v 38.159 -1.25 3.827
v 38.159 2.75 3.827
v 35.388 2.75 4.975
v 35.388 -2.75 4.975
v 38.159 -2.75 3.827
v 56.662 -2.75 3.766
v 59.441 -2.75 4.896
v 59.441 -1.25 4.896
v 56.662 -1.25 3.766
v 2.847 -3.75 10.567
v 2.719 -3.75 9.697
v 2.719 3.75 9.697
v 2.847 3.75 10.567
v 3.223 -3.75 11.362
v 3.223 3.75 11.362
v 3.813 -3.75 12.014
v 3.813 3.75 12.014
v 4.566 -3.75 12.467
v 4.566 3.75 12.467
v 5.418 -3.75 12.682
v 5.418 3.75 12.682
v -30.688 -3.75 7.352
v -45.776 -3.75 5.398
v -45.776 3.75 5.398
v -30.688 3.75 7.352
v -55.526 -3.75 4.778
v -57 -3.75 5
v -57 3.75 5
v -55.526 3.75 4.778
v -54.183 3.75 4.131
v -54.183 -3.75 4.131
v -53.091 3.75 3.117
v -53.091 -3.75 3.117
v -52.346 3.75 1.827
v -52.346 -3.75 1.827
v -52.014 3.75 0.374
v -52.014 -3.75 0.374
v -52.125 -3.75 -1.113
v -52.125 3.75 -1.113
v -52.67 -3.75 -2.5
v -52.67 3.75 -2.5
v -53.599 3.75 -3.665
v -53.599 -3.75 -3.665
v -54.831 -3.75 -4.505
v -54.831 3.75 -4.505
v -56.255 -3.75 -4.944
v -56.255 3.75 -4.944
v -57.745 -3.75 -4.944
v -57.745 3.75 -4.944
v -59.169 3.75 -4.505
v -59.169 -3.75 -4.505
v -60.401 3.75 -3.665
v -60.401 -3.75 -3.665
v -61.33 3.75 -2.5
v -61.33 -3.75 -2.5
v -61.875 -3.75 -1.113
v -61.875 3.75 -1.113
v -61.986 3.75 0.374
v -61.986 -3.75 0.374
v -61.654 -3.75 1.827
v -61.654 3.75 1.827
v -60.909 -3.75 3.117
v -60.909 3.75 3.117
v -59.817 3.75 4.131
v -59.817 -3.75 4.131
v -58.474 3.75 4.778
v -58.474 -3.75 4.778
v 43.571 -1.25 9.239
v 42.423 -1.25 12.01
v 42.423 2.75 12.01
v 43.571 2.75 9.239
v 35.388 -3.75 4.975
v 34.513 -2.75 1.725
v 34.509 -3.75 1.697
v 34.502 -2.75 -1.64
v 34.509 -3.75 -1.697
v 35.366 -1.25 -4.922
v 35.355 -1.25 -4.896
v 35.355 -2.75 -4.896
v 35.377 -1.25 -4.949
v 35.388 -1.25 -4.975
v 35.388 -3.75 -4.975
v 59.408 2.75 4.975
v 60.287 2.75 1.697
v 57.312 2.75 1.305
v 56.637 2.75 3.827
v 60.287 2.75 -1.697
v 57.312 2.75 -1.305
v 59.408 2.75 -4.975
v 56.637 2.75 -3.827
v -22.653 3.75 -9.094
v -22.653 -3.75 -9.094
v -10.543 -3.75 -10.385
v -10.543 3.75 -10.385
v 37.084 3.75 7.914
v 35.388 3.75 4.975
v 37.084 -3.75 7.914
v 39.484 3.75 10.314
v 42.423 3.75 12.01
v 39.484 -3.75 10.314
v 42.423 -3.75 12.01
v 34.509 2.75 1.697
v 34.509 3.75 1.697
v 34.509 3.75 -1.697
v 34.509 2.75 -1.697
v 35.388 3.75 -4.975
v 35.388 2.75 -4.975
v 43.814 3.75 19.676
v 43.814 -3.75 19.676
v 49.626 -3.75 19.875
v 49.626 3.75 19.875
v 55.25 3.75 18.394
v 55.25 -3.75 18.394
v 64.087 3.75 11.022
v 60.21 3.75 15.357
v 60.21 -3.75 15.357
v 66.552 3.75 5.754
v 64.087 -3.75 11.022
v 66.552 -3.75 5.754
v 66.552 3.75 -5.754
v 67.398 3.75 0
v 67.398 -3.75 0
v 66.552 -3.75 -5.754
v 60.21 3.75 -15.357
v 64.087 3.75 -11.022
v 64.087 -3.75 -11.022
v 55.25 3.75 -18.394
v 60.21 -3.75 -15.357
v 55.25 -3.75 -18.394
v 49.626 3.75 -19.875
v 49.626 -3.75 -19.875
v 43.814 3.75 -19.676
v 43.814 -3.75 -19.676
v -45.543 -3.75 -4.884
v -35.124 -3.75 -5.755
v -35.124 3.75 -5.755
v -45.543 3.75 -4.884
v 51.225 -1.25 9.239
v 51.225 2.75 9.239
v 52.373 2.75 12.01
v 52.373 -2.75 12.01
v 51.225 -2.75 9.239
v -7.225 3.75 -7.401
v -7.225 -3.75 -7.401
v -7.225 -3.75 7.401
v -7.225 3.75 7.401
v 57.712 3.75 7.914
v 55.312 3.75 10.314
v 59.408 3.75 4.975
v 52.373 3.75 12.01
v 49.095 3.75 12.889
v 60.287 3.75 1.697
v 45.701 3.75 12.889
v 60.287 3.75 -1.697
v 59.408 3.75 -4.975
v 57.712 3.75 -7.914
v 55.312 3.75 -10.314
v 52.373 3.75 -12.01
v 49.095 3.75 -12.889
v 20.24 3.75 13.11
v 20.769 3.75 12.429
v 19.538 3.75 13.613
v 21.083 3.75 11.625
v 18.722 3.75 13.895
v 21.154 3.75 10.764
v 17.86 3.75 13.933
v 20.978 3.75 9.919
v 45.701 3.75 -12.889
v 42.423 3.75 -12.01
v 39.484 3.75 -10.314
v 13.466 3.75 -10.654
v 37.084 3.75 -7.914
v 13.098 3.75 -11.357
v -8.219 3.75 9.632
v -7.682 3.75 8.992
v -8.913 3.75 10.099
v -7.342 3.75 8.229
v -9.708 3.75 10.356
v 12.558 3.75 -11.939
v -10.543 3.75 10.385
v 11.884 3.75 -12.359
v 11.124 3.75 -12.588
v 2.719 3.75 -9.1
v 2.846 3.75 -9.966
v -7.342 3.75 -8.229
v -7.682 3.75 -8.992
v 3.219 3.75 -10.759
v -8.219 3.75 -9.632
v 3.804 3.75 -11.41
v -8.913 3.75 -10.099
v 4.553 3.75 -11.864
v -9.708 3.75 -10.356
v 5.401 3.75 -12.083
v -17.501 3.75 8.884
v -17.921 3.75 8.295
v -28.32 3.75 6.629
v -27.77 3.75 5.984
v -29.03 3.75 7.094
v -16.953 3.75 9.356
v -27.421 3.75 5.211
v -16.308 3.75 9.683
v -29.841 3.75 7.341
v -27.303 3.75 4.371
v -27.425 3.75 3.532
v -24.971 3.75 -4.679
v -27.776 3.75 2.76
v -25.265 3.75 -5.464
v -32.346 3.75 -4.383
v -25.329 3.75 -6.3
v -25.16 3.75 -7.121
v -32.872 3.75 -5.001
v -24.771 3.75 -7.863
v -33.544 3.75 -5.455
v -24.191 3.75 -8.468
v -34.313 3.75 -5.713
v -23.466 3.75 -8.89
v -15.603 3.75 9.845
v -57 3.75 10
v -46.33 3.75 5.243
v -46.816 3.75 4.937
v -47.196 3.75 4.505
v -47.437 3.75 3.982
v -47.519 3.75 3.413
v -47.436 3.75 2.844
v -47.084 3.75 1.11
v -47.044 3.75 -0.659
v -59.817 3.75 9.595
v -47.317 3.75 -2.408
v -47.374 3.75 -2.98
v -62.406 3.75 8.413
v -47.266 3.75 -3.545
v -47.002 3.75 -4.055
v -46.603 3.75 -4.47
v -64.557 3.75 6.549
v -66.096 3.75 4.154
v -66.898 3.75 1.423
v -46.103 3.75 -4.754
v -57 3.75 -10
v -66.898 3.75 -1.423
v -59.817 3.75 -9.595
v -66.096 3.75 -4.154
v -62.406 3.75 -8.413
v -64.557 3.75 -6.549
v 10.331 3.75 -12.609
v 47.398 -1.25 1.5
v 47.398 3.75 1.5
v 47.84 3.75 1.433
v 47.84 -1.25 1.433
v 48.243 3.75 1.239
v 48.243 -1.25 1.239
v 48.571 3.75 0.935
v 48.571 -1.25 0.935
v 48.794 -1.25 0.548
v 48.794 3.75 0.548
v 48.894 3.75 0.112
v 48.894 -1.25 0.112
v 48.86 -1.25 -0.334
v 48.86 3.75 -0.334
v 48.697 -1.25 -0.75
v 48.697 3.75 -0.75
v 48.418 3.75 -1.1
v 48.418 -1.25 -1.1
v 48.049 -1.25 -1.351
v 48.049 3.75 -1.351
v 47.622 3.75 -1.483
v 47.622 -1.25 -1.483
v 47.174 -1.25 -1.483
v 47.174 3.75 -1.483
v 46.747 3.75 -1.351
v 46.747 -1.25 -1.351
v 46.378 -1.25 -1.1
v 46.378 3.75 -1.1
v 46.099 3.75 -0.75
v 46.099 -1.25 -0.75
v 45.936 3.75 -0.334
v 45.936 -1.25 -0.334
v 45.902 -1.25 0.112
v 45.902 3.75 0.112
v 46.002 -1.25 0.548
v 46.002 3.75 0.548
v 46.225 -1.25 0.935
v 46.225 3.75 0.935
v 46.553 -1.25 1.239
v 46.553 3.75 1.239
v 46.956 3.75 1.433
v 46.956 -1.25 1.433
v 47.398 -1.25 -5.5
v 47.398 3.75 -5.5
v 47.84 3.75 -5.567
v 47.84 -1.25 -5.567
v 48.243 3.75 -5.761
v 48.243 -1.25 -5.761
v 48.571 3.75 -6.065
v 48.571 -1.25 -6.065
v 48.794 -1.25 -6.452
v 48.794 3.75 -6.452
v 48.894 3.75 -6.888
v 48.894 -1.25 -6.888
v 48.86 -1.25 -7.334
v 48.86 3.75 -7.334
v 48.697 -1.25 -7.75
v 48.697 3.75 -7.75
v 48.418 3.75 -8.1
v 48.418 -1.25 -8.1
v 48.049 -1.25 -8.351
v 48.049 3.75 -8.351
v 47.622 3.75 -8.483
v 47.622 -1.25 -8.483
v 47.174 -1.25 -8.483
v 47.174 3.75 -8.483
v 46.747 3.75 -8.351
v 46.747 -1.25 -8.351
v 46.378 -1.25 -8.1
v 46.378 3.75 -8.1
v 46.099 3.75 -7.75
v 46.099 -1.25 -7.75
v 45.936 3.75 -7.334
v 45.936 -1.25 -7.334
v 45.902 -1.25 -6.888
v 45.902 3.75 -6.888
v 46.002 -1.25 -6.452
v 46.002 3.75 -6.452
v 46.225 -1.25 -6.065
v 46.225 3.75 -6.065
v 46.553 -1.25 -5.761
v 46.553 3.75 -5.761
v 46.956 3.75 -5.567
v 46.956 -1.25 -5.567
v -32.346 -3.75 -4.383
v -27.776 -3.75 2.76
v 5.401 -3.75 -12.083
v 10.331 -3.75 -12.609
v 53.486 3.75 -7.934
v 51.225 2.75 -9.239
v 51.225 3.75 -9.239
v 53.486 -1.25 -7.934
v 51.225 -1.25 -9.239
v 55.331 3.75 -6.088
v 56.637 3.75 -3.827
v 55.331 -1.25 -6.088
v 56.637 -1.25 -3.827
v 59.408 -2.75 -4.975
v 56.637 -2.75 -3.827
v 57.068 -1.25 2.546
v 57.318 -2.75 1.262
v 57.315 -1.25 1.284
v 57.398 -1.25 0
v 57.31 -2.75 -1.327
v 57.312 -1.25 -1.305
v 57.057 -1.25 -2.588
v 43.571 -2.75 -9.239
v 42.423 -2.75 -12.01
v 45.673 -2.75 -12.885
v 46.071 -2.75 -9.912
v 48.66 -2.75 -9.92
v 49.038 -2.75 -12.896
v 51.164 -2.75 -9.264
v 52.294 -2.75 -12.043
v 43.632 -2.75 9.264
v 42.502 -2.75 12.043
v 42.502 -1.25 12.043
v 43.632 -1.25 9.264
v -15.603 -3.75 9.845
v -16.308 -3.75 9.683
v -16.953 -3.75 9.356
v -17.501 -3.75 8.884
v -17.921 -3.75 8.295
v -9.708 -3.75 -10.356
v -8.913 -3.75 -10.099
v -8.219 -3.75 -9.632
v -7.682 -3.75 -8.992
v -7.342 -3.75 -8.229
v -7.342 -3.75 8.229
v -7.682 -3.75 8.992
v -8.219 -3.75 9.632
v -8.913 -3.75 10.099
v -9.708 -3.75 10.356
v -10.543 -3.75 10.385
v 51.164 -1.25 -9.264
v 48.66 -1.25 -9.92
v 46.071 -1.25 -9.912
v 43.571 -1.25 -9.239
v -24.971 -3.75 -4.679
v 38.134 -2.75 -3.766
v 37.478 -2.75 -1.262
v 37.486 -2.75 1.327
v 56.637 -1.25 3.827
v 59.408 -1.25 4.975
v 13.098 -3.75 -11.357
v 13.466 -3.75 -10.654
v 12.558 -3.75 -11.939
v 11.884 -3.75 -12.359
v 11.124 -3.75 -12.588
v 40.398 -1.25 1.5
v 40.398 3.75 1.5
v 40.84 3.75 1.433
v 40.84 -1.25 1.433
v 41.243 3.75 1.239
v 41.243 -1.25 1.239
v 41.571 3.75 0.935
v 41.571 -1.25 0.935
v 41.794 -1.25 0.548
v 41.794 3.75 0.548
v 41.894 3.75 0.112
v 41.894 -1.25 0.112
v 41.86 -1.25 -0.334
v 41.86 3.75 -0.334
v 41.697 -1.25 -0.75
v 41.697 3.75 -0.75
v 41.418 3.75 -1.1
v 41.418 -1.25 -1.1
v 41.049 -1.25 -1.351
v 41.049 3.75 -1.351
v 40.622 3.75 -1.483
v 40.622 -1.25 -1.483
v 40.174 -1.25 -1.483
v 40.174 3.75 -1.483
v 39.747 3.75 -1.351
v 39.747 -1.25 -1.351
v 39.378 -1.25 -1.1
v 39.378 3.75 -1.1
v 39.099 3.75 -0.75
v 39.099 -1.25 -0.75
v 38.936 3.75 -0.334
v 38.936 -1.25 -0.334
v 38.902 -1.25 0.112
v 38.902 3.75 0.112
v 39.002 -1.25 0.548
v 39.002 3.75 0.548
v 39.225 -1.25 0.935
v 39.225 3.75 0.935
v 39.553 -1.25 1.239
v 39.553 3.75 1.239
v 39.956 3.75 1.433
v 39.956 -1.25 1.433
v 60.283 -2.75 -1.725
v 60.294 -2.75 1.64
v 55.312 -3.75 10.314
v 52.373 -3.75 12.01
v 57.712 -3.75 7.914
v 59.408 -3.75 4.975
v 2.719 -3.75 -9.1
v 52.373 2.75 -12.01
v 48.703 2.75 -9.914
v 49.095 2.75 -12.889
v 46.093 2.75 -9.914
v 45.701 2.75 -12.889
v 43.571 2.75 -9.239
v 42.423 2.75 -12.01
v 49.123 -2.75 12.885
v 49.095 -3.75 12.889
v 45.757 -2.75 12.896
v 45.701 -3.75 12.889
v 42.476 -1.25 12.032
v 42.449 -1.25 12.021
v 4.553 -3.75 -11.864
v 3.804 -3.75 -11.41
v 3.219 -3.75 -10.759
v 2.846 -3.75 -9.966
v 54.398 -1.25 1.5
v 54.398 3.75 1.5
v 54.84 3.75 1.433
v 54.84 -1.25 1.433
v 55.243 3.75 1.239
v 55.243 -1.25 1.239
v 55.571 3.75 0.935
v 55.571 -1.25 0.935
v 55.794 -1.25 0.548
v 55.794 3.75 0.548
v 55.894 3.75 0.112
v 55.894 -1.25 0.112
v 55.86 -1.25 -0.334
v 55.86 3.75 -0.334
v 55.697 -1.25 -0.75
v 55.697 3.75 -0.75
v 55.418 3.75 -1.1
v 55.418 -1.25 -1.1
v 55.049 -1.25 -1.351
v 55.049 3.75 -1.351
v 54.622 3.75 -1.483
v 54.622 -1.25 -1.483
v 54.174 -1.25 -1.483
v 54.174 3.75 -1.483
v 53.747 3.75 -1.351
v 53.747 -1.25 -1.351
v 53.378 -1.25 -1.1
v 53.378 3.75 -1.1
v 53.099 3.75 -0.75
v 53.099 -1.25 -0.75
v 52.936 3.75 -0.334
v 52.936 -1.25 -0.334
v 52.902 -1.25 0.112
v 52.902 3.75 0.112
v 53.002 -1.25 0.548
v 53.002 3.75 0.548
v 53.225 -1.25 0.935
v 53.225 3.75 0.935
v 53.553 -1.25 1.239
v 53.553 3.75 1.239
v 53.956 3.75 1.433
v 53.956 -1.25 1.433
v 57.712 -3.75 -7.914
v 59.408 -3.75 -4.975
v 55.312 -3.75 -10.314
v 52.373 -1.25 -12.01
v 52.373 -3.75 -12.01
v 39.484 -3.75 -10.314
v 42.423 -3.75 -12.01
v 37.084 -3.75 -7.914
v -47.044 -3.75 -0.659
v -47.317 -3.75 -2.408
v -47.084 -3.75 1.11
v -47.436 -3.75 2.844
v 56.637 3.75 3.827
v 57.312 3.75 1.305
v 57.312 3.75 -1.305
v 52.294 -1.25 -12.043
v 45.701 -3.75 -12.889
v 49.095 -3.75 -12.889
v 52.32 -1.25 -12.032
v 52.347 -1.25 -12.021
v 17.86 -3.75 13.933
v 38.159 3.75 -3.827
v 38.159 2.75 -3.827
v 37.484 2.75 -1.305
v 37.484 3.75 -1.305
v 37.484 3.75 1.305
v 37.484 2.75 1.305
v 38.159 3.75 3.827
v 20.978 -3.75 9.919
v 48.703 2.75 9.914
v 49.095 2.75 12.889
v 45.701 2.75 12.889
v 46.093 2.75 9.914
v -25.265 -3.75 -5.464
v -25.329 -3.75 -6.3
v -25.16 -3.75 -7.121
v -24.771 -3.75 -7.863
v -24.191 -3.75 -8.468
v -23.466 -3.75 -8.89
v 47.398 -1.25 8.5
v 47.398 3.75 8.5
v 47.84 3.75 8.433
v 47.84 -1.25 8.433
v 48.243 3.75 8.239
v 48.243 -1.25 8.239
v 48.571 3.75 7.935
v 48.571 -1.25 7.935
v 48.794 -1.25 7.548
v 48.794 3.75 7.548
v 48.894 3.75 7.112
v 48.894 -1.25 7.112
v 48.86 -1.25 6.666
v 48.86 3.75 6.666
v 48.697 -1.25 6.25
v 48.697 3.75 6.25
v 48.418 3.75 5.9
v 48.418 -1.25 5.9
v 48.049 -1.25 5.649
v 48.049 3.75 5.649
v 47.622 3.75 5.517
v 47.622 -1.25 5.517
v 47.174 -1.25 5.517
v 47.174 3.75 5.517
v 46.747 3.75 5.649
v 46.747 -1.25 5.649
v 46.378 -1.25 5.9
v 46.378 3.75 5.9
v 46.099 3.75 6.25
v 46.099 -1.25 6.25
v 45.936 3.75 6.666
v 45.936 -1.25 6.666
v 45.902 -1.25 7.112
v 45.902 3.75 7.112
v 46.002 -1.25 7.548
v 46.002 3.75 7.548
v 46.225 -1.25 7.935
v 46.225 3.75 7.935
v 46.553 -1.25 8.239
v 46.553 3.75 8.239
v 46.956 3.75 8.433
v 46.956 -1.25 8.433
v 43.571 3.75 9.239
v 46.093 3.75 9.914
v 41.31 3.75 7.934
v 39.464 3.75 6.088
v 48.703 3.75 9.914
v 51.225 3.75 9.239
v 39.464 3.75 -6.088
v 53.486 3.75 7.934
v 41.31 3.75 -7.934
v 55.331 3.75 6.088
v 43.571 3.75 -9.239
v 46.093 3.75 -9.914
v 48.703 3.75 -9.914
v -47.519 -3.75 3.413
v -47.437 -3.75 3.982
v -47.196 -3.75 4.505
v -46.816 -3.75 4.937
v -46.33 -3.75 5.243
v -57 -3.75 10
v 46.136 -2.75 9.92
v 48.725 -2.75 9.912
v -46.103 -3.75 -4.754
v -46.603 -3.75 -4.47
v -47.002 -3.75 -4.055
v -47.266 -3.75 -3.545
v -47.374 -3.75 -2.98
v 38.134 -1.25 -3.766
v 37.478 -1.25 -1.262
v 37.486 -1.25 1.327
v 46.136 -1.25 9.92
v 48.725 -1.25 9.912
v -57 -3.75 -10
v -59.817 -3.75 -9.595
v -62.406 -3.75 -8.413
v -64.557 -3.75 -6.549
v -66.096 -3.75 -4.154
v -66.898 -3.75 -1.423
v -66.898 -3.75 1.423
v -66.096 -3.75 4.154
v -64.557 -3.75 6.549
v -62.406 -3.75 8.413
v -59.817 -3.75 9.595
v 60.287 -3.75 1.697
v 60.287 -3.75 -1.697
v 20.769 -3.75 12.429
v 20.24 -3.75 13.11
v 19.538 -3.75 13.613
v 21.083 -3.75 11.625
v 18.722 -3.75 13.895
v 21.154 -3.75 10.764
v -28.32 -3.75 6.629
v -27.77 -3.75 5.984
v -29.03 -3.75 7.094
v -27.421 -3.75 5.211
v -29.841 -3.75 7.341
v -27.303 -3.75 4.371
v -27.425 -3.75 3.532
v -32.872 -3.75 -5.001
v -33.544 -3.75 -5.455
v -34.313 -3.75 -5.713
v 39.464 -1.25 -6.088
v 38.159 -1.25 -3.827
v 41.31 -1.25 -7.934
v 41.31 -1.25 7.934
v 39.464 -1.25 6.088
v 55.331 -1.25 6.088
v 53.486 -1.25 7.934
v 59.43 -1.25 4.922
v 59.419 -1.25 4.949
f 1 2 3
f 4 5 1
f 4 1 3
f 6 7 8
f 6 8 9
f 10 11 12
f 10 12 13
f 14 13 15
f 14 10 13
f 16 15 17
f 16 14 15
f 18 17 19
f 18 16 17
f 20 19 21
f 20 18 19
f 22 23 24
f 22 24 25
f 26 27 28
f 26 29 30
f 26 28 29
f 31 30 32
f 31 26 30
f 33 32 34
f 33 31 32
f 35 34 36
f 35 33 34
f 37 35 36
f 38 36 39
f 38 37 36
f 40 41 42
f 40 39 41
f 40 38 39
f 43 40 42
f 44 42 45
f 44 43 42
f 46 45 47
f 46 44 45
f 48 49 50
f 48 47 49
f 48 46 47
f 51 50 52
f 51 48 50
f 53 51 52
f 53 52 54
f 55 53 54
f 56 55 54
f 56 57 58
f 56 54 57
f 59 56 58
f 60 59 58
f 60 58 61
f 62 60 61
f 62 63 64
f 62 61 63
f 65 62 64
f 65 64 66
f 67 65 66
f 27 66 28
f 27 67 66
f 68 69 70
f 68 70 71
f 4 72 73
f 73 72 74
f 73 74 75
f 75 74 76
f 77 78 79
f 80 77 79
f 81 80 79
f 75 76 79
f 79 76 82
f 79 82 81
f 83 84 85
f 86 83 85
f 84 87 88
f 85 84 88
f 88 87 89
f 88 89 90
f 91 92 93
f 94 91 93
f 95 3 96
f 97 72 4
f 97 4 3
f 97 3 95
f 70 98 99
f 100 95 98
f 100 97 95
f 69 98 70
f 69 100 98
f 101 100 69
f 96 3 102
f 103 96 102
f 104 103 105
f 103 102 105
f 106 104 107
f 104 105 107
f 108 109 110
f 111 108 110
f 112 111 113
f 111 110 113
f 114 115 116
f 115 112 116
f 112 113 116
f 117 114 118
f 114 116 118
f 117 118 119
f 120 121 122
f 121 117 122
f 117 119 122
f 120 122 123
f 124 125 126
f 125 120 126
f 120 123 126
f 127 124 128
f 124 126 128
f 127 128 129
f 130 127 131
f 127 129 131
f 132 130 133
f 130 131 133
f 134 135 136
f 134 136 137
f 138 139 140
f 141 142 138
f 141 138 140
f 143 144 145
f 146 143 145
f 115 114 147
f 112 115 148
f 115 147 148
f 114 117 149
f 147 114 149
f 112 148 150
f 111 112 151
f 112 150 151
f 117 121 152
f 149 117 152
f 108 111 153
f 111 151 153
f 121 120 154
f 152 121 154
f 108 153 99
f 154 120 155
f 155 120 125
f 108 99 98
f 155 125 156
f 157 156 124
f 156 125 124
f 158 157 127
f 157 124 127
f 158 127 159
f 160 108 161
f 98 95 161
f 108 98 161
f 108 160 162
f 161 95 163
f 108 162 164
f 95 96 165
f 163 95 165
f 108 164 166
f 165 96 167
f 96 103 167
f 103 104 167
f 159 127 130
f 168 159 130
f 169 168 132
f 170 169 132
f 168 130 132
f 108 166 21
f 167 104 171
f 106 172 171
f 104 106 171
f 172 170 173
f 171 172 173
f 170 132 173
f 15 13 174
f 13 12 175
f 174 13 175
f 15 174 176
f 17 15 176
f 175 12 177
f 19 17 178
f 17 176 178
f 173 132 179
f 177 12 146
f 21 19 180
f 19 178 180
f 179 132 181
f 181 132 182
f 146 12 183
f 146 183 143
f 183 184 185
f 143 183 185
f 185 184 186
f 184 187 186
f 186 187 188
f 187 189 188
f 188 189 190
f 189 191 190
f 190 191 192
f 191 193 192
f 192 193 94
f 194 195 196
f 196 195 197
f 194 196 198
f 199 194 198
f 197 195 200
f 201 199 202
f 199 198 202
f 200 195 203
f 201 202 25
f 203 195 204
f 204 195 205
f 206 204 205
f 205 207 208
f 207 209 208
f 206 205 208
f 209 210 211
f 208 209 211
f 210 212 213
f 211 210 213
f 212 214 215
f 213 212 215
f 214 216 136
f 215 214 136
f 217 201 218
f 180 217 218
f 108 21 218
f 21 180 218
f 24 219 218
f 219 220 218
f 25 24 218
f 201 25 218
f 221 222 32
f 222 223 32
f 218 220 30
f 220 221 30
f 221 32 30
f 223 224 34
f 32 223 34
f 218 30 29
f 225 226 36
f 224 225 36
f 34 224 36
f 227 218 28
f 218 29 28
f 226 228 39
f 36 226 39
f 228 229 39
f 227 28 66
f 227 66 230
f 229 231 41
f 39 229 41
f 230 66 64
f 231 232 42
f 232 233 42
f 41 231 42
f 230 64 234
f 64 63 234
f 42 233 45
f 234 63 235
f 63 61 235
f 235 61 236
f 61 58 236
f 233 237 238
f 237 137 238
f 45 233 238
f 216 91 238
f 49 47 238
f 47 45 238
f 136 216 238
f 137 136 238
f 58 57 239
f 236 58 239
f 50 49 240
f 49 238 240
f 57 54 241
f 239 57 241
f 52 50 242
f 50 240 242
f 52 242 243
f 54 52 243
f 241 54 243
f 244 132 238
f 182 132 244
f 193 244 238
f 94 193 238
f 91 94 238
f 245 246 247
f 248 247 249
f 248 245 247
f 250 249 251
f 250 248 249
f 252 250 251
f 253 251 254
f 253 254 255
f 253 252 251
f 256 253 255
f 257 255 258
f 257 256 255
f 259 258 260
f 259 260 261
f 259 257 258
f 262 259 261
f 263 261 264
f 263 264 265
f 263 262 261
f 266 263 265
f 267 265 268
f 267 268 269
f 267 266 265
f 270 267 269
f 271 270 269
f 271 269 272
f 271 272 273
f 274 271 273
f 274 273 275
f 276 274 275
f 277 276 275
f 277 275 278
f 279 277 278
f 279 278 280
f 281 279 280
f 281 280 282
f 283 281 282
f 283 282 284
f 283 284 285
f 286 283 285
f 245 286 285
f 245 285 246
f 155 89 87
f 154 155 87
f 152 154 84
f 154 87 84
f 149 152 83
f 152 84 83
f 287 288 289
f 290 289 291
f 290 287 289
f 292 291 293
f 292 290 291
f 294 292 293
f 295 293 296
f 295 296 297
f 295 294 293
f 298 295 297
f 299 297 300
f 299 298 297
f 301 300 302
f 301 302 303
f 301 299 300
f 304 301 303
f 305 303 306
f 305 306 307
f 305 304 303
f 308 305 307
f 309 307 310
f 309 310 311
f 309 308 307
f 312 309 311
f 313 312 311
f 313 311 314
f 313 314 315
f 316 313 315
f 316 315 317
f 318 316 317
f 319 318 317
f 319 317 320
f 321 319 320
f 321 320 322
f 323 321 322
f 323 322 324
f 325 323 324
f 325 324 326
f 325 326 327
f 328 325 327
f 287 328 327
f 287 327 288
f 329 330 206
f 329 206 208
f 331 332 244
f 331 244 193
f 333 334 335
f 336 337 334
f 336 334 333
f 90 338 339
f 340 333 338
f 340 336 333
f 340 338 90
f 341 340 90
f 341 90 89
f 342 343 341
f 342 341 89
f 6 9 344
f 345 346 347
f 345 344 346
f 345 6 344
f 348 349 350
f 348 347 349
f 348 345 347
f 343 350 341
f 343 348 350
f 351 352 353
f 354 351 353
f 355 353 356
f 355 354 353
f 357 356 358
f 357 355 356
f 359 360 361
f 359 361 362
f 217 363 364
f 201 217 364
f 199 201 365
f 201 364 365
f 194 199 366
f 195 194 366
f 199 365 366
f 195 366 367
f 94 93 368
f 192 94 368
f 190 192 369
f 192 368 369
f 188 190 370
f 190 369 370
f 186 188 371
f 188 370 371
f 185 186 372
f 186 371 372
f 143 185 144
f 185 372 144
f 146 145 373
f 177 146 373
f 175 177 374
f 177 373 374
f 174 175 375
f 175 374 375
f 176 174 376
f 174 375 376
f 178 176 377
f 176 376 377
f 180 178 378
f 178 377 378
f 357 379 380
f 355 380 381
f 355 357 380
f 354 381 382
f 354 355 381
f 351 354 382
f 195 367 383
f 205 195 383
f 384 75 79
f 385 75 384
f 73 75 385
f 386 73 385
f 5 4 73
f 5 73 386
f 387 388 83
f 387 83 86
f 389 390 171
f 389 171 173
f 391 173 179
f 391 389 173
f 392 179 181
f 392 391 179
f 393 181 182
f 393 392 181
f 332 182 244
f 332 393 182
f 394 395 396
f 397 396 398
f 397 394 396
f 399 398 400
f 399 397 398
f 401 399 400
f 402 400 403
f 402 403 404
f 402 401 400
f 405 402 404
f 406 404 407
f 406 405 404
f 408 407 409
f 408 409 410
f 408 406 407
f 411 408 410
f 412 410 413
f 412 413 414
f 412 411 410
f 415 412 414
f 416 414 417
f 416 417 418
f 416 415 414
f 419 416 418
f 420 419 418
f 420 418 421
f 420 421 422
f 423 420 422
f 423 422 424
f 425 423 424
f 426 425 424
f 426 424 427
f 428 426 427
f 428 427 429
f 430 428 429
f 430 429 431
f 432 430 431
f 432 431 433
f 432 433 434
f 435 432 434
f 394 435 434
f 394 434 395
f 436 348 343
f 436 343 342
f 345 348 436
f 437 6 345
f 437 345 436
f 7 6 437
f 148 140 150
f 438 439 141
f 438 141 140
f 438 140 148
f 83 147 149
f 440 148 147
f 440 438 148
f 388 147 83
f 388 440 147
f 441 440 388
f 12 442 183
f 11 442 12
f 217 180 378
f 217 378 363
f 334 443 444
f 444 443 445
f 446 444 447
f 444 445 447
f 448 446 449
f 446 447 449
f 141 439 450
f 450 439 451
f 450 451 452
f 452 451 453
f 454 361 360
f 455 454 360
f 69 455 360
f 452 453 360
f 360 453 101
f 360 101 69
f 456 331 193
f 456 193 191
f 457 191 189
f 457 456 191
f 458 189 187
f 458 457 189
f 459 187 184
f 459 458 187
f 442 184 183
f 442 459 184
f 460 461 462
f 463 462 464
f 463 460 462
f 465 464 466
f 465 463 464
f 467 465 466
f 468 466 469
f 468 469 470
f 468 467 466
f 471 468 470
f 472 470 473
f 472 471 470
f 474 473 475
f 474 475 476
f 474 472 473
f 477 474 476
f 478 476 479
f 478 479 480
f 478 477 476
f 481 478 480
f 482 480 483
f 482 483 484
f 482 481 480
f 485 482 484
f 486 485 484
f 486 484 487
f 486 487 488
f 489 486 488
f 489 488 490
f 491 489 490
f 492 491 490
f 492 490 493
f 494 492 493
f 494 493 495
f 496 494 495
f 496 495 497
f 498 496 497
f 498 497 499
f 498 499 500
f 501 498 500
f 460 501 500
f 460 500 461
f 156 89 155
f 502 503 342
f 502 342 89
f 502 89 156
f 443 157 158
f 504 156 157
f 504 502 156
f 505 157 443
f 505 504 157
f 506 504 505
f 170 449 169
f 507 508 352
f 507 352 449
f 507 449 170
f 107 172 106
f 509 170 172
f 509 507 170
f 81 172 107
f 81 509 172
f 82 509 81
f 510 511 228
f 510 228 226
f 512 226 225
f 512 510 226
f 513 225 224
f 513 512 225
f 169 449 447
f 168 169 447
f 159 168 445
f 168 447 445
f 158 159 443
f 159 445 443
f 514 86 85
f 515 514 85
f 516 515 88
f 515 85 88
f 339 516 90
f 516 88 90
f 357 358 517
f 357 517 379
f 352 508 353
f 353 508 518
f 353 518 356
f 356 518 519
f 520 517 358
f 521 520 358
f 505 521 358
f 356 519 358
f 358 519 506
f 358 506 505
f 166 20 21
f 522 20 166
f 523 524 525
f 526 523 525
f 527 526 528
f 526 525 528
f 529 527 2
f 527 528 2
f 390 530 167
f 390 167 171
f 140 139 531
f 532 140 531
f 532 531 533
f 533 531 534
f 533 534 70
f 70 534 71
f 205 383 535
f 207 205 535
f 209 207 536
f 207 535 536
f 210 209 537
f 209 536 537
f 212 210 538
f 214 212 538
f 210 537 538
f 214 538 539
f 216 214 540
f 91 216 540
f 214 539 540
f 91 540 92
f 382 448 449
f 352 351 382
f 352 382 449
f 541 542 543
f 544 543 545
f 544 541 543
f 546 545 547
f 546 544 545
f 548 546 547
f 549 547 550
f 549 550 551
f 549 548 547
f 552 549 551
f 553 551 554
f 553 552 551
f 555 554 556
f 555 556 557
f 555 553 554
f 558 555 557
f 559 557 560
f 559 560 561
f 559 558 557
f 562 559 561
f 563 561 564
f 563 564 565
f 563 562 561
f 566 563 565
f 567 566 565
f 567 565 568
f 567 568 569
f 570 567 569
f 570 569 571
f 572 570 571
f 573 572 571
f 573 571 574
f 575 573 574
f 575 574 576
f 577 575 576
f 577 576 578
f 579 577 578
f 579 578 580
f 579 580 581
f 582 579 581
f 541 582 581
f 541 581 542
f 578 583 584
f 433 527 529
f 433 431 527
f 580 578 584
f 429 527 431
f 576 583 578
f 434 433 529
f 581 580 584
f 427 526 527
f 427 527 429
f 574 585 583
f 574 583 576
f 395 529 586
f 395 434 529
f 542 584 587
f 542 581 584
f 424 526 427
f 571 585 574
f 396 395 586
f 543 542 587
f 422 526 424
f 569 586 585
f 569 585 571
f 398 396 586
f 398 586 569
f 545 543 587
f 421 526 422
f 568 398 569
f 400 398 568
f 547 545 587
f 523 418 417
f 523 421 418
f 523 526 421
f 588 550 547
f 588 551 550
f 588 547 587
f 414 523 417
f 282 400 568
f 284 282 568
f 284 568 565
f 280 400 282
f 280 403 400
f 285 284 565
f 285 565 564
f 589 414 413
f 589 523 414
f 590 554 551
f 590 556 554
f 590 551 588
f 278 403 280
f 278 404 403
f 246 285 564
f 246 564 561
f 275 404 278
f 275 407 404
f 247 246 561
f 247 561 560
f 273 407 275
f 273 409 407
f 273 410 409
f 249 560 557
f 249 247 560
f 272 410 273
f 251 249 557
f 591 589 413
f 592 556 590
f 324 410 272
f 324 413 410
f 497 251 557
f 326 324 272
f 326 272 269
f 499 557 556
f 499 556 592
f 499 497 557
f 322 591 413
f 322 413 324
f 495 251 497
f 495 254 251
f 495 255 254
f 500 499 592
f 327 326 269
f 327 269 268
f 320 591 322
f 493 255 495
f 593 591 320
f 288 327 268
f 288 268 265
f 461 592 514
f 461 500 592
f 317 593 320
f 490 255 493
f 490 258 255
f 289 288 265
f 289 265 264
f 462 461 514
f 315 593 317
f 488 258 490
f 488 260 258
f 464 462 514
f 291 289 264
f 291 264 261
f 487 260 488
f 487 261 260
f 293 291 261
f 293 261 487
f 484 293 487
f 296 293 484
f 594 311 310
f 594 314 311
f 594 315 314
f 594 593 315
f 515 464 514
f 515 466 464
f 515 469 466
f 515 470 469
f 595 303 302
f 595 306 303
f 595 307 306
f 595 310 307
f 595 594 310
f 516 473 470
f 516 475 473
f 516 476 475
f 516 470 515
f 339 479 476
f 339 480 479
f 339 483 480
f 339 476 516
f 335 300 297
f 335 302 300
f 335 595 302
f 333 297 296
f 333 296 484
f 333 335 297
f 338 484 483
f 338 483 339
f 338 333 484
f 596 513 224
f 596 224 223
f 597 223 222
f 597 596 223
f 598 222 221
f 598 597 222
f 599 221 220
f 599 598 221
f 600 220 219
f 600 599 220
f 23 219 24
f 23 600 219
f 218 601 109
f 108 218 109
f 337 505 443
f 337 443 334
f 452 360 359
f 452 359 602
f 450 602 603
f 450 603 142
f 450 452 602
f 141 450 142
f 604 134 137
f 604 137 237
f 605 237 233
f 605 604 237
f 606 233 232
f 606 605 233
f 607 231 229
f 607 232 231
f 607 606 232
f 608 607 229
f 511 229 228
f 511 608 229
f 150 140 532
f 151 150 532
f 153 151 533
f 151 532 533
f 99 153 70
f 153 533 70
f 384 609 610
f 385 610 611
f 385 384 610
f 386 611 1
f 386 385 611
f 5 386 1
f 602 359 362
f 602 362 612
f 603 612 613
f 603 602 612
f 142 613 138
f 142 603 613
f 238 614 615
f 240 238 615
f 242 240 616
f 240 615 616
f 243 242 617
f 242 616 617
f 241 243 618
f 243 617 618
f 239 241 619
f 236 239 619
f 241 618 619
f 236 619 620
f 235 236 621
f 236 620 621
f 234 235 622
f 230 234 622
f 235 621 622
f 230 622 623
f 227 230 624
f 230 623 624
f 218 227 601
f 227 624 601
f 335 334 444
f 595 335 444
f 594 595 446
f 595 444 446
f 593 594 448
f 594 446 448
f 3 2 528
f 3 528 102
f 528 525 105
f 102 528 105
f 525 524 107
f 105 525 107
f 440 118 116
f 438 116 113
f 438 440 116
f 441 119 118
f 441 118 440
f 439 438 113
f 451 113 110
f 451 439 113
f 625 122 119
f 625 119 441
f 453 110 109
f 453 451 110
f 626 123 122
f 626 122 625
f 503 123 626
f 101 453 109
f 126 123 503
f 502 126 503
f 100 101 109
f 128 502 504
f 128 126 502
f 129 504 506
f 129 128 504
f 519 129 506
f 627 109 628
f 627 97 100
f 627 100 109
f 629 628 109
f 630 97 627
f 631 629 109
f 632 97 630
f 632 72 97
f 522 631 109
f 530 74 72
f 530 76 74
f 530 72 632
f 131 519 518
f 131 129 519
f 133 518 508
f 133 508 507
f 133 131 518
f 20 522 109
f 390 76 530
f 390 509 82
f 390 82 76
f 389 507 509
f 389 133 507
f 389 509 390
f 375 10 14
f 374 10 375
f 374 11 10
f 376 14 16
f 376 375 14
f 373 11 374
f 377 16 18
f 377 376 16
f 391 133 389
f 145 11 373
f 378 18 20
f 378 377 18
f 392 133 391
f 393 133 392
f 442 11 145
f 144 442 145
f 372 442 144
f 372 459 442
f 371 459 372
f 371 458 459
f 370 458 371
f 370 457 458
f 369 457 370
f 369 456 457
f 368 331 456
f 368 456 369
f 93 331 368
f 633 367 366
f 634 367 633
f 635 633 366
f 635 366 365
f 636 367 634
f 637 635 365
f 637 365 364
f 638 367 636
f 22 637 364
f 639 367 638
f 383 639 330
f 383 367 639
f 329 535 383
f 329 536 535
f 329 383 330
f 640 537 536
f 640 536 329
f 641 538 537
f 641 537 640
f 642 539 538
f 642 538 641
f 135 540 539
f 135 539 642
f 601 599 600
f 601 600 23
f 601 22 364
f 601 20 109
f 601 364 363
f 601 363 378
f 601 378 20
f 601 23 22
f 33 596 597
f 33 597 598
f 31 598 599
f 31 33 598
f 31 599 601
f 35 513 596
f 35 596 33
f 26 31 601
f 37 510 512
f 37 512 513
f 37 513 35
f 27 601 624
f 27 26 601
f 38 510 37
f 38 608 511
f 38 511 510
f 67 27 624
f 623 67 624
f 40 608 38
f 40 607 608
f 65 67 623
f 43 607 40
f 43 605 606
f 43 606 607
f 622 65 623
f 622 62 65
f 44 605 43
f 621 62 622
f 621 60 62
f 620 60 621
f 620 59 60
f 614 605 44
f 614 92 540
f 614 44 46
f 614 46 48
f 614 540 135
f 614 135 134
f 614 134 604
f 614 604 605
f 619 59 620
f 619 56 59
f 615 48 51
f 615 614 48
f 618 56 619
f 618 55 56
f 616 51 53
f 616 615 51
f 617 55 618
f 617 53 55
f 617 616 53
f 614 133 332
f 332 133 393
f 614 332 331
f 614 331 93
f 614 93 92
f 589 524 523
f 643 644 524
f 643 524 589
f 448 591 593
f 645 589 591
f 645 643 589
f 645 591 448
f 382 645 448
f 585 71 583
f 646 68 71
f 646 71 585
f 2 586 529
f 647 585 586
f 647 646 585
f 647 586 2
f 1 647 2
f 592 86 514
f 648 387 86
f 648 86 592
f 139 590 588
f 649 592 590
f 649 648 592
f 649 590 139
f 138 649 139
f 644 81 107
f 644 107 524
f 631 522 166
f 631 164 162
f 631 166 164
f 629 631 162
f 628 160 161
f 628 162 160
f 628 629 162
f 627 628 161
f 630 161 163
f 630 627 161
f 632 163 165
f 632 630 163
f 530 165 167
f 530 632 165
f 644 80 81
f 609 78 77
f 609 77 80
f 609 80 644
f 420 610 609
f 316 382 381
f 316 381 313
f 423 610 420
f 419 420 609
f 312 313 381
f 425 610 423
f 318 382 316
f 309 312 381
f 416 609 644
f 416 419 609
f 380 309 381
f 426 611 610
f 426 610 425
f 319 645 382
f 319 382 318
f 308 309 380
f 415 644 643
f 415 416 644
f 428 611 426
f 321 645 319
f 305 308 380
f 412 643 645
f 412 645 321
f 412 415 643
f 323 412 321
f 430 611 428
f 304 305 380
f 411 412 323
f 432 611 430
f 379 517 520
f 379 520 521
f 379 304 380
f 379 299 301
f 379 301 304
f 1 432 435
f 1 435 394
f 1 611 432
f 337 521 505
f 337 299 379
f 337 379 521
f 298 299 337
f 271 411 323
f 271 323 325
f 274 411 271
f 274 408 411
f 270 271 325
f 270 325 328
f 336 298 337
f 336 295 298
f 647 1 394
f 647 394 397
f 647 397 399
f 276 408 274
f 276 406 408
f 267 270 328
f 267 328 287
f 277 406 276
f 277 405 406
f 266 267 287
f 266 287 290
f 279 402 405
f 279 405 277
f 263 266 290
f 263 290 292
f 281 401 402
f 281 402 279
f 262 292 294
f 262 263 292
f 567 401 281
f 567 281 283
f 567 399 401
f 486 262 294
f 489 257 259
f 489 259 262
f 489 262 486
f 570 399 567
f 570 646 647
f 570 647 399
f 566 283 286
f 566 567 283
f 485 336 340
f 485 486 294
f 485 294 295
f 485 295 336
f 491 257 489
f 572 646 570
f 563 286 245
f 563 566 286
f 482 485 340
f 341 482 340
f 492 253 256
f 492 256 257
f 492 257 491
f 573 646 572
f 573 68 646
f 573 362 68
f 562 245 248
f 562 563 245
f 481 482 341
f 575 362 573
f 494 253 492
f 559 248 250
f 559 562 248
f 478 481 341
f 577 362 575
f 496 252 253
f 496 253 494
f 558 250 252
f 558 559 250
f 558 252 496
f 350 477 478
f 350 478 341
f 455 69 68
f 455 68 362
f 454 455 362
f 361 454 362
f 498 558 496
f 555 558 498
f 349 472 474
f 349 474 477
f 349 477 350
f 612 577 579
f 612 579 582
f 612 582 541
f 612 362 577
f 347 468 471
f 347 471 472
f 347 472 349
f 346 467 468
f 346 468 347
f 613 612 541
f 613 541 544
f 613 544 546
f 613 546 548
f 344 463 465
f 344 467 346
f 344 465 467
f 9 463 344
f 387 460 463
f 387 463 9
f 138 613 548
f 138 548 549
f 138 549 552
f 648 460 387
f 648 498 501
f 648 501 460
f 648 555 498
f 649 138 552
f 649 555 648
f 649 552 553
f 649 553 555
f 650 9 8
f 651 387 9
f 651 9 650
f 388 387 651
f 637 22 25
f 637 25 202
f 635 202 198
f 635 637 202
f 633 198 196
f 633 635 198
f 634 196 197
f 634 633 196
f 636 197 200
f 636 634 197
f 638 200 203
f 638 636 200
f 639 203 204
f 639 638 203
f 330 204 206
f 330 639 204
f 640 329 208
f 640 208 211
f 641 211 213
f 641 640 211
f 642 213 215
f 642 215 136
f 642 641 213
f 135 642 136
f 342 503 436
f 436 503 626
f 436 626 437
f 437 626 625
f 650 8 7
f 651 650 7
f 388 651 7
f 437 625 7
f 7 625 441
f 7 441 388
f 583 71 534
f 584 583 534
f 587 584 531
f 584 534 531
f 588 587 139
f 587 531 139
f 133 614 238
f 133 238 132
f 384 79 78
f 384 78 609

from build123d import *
from build123d.topology import SkipClean

# Parameters (mm, degrees)
EXTRUDE_1_DEPTH          = 47
EXTRUDE_1_DEPTH_BACK     = 57
EXTRUDE_2_DEPTH          = 3.75
EXTRUDE_2_DEPTH_BACK     = 3.75
SKETCH_2_R               = 20
CUT_EXTRUDE_1_DEPTH      = 3.75
CUT_EXTRUDE_1_DEPTH_BACK = 3.75
SKETCH_3_R               = 1.5
CUT_EXTRUDE_START        = -1
CUT_EXTRUDE_2_DEPTH      = 1
SKETCH_5_R               = 1.5
CUT_EXTRUDE_3_DEPTH      = 2.5
EXTRUDE_START            = 1.5
EXTRUDE_3_DEPTH          = 1.5
EXTRUDE_4_DEPTH          = 3.75
EXTRUDE_4_DEPTH_BACK     = 3.75
SKETCH_7_R               = 10
SKETCH_7_R_2             = 5
CUT_EXTRUDE_4_DEPTH      = 3.75
CUT_EXTRUDE_4_DEPTH_BACK = 3.75
SKETCH_8_R               = 5
EXTRUDE_5_DEPTH          = 3.75
EXTRUDE_5_DEPTH_BACK     = 3.75
CUT_EXTRUDE_5_DEPTH      = 3.75
CUT_EXTRUDE_5_DEPTH_BACK = 3.75


with BuildPart() as part:
    # 草图1 → 凸台-拉伸1 (new, two sides: drawn at the far end of the back side and taken through both)
    with BuildSketch(Plane(origin=(0, 0, 0), x_dir=(0, 0, -1), z_dir=(1, 0, 0)).offset(-EXTRUDE_1_DEPTH_BACK)):
        Polygon((10, 0), (10, 3.75), (-10, 3.75), (-10, -3.75), (10, -3.75), align=None)
    extrude(amount=EXTRUDE_1_DEPTH + EXTRUDE_1_DEPTH_BACK)

    # 草图2 → 凸台-拉伸2 (add, two sides: drawn at the far end of the back side and taken through both)
    with BuildSketch(Plane(origin=(0, 0, 0), x_dir=(1, 0, 0), z_dir=(0, 1, 0)).offset(-EXTRUDE_2_DEPTH_BACK)):
        with Locations((47.397956018, 0)):
            Circle(SKETCH_2_R)
    extrude(amount=EXTRUDE_2_DEPTH + EXTRUDE_2_DEPTH_BACK)

    # 草图3 → 切除-拉伸1 (cut, two sides: drawn at the far end of the back side and taken through both)
    with BuildSketch(Plane(origin=(0, 0, 0), x_dir=(1, 0, 0), z_dir=(0, 1, 0)).offset(-CUT_EXTRUDE_1_DEPTH_BACK)):
        with BuildLine():
            ThreePointArc((52.372840639, -12.010433923), (56.590344173, -9.192388155), (59.408389941, -4.974884621))
            Line((59.408389941, -4.974884621), (56.636751343, -3.826834324))
            ThreePointArc((56.636751343, -3.826834324), (54.46902383, -7.071067812), (51.224790342, -9.238795325))
            Line((51.224790342, -9.238795325), (52.372840639, -12.010433923))
        make_face()
        with BuildLine():
            ThreePointArc((35.387522095, -4.974884621), (38.205567863, -9.192388155), (42.423071397, -12.010433923))
            Line((42.423071397, -12.010433923), (43.571121694, -9.238795325))
            ThreePointArc((43.571121694, -9.238795325), (40.326888206, -7.071067812), (38.159160693, -3.826834324))
            Line((38.159160693, -3.826834324), (35.387522095, -4.974884621))
        make_face()
        with BuildLine():
            Line((56.636751343, 3.826834324), (59.408389941, 4.974884621))
            ThreePointArc((59.408389941, 4.974884621), (56.590344173, 9.192388155), (52.372840639, 12.010433923))
            Line((52.372840639, 12.010433923), (51.224790342, 9.238795325))
            ThreePointArc((51.224790342, 9.238795325), (54.46902383, 7.071067812), (56.636751343, 3.826834324))
        make_face()
        with BuildLine():
            ThreePointArc((42.423071397, 12.010433923), (38.205567863, 9.192388155), (35.387522095, 4.974884621))
            Line((35.387522095, 4.974884621), (38.159160693, 3.826834324))
            ThreePointArc((38.159160693, 3.826834324), (40.326888206, 7.071067812), (43.571121694, 9.238795325))
            Line((43.571121694, 9.238795325), (42.423071397, 12.010433923))
        make_face()
        with Locations((47.397956018, 7)):
            Circle(SKETCH_3_R)
        with Locations((47.397956018, 0)):
            Circle(SKETCH_3_R)
        with Locations((54.397956018, 0)):
            Circle(SKETCH_3_R)
        with Locations((47.397956018, -7)):
            Circle(SKETCH_3_R)
        with Locations((40.397956018, 0)):
            Circle(SKETCH_3_R)
    extrude(amount=CUT_EXTRUDE_1_DEPTH + CUT_EXTRUDE_1_DEPTH_BACK, mode=Mode.SUBTRACT)

    # 草图4 → 切除-拉伸2 (cut)
    with SkipClean():  # the faces are left unmerged after this step: merging them gives an invalid solid
        with BuildSketch(Plane(origin=(0, 3.75, 0), x_dir=(1, 0, 0), z_dir=(0, 1, 0)).offset(CUT_EXTRUDE_START)):
            with BuildLine():
                Line((43.571121694, 9.238795325), (42.423071397, 12.010433923))
                ThreePointArc((42.423071397, 12.010433923), (47.397956018, 13), (52.372840639, 12.010433923))
                Line((52.372840639, 12.010433923), (51.224790342, 9.238795325))
                ThreePointArc((51.224790342, 9.238795325), (47.397956018, 10), (43.571121694, 9.238795325))
            make_face()
            with BuildLine():
                Line((56.636751343, 3.826834324), (59.408389941, 4.974884621))
                ThreePointArc((59.408389941, 4.974884621), (60.397956018, 0), (59.408389941, -4.974884621))
                Line((59.408389941, -4.974884621), (56.636751343, -3.826834324))
                ThreePointArc((56.636751343, -3.826834324), (57.397956018, 0), (56.636751343, 3.826834324))
            make_face()
            with BuildLine():
                Line((51.224790342, -9.238795325), (52.372840639, -12.010433923))
                ThreePointArc((52.372840639, -12.010433923), (47.397956018, -13), (42.423071397, -12.010433923))
                Line((42.423071397, -12.010433923), (43.571121694, -9.238795325))
                ThreePointArc((43.571121694, -9.238795325), (47.397956018, -10), (51.224790342, -9.238795325))
            make_face()
            with BuildLine():
                Line((38.159160693, -3.826834324), (35.387522095, -4.974884621))
                ThreePointArc((35.387522095, -4.974884621), (34.397956018, 0), (35.387522095, 4.974884621))
                Line((35.387522095, 4.974884621), (38.159160693, 3.826834324))
                ThreePointArc((38.159160693, 3.826834324), (37.397956018, 0), (38.159160693, -3.826834324))
            make_face()
        extrude(amount=CUT_EXTRUDE_2_DEPTH, mode=Mode.SUBTRACT)

    # 草图5 → 切除-拉伸3 (cut)
    with SkipClean():  # the faces are left unmerged after this step: merging them gives an invalid solid
        with BuildSketch(Plane.XZ.offset(3.75)):
            with BuildLine():
                ThreePointArc((51.224790342, -9.238795325), (54.46902383, -7.071067812), (56.636751343, -3.826834324))
                Line((56.636751343, -3.826834324), (59.408389941, -4.974884621))
                ThreePointArc((59.408389941, -4.974884621), (60.397956018, 0), (59.408389941, 4.974884621))
                Line((59.408389941, 4.974884621), (56.636751343, 3.826834324))
                ThreePointArc((56.636751343, 3.826834324), (54.46902383, 7.071067812), (51.224790342, 9.238795325))
                Line((51.224790342, 9.238795325), (52.372840639, 12.010433923))
                ThreePointArc((52.372840639, 12.010433923), (47.397956018, 13), (42.423071397, 12.010433923))
                Line((42.423071397, 12.010433923), (43.571121694, 9.238795325))
                ThreePointArc((43.571121694, 9.238795325), (40.326888206, 7.071067812), (38.159160693, 3.826834324))
                Line((38.159160693, 3.826834324), (35.387522095, 4.974884621))
                ThreePointArc((35.387522095, 4.974884621), (34.397956018, 0), (35.387522095, -4.974884621))
                Line((35.387522095, -4.974884621), (38.159160693, -3.826834324))
                ThreePointArc((38.159160693, -3.826834324), (40.326888206, -7.071067812), (43.571121694, -9.238795325))
                Line((43.571121694, -9.238795325), (42.423071397, -12.010433923))
                ThreePointArc((42.423071397, -12.010433923), (47.397956018, -13), (52.372840639, -12.010433923))
                Line((52.372840639, -12.010433923), (51.224790342, -9.238795325))
            make_face()
            with Locations((47.397956018, -7)):
                Circle(SKETCH_5_R, mode=Mode.SUBTRACT)
            with Locations((54.397956018, 0)):
                Circle(SKETCH_5_R, mode=Mode.SUBTRACT)
            with Locations((40.397956018, 0)):
                Circle(SKETCH_5_R, mode=Mode.SUBTRACT)
            with Locations((47.397956018, 0)):
                Circle(SKETCH_5_R, mode=Mode.SUBTRACT)
            with Locations((47.397956018, 7)):
                Circle(SKETCH_5_R, mode=Mode.SUBTRACT)
        extrude(amount=-CUT_EXTRUDE_3_DEPTH, mode=Mode.SUBTRACT)

    # 草图6 → 凸台-拉伸3 (add)
    with SkipClean():  # the faces are left unmerged after this step: merging them gives an invalid solid
        with BuildSketch(Plane.XZ.offset(1.25).offset(EXTRUDE_START)):
            with BuildLine():
                Line((59.440760131, 4.896005422), (56.66165149, 3.766158017))
                ThreePointArc((56.66165149, 3.766158017), (57.397902247, -0.032793412), (56.636751343, -3.826834324))
                Line((56.636751343, -3.826834324), (59.408389941, -4.974884621))
                ThreePointArc((59.408389941, -4.974884621), (60.397886116, -0.042631436), (59.440760131, 4.896005422))
            make_face()
            with BuildLine():
                Line((42.501950596, 12.042804113), (43.631798001, 9.263695472))
                ThreePointArc((43.631798001, 9.263695472), (47.43074943, 9.999946229), (51.224790342, 9.238795325))
                Line((51.224790342, 9.238795325), (52.372840639, 12.010433923))
                ThreePointArc((52.372840639, 12.010433923), (47.440587454, 12.999930098), (42.501950596, 12.042804113))
            make_face()
            with BuildLine():
                Line((52.29396144, -12.042804113), (51.164114035, -9.263695472))
                ThreePointArc((51.164114035, -9.263695472), (47.365162606, -9.999946229), (43.571121694, -9.238795325))
                Line((43.571121694, -9.238795325), (42.423071397, -12.010433923))
                ThreePointArc((42.423071397, -12.010433923), (47.355324582, -12.999930098), (52.29396144, -12.042804113))
            make_face()
            with BuildLine():
                Line((35.355151905, -4.896005422), (38.134260546, -3.766158017))
                ThreePointArc((38.134260546, -3.766158017), (37.398009789, 0.032793412), (38.159160693, 3.826834324))
                Line((38.159160693, 3.826834324), (35.387522095, 4.974884621))
                ThreePointArc((35.387522095, 4.974884621), (34.39802592, 0.042631436), (35.355151905, -4.896005422))
            make_face()
        extrude(amount=-EXTRUDE_3_DEPTH)

    # 草图7 → 凸台-拉伸4 (add, two sides: drawn at the far end of the back side and taken through both)
    with SkipClean():  # the faces are left unmerged after this step: merging them gives an invalid solid
        with BuildSketch(Plane(origin=(0, 0, 0), x_dir=(1, 0, 0), z_dir=(0, 1, 0)).offset(-EXTRUDE_4_DEPTH_BACK)):
            with Locations((-57, 0)):
                Circle(SKETCH_7_R)
            with Locations((-57, 0)):
                Circle(SKETCH_7_R_2, mode=Mode.SUBTRACT)
        extrude(amount=EXTRUDE_4_DEPTH + EXTRUDE_4_DEPTH_BACK)

    # 草图8 → 切除-拉伸4 (cut, two sides: drawn at the far end of the back side and taken through both)
    with SkipClean():  # the faces are left unmerged after this step: merging them gives an invalid solid
        with BuildSketch(Plane(origin=(0, 0, 0), x_dir=(1, 0, 0), z_dir=(0, 1, 0)).offset(-CUT_EXTRUDE_4_DEPTH_BACK)):
            with Locations((-57, 0)):
                Circle(SKETCH_8_R)
        extrude(amount=CUT_EXTRUDE_4_DEPTH + CUT_EXTRUDE_4_DEPTH_BACK, mode=Mode.SUBTRACT)

    # 草图9 → 凸台-拉伸5 (add, two sides: drawn at the far end of the back side and taken through both)
    with SkipClean():  # the faces are left unmerged after this step: merging them gives an invalid solid
        with BuildSketch(Plane(origin=(0, 0, 0), x_dir=(1, 0, 0), z_dir=(0, 1, 0)).offset(-EXTRUDE_5_DEPTH_BACK)):
            with BuildLine():
                Line((-57, 10), (43.813925273, 19.676247702))
                ThreePointArc((43.813925273, 19.676247702), (35.88025754, 16.350615333), (30.077447942, 10))
                Line((30.077447942, 10), (-57, 10))
            make_face()
            with BuildLine():
                Line((-57, -10), (43.813925273, -19.676247702))
                ThreePointArc((43.813925273, -19.676247702), (35.88025754, -16.350615333), (30.077447942, -10))
                Line((30.077447942, -10), (-57, -10))
            make_face()
        extrude(amount=EXTRUDE_5_DEPTH + EXTRUDE_5_DEPTH_BACK)

    # 草图10 → 切除-拉伸5 (cut, two sides: drawn at the far end of the back side and taken through both)
    with BuildSketch(Plane(origin=(0, 0, 0), x_dir=(1, 0, 0), z_dir=(0, 1, 0)).offset(-CUT_EXTRUDE_5_DEPTH_BACK)):
        with BuildLine():
            Line((-17.9208659, -8.294738781), (-24.97116153, 4.678580119))
            ThreePointArc((-24.97116153, 4.678580119), (-24.991476986, 7.505496331), (-22.653103706, 9.094168225))
            Line((-22.653103706, 9.094168225), (-10.542995546, 10.384503445))
            ThreePointArc((-10.542995546, 10.384503445), (-8.219346695, 9.632258445), (-7.225143941, 7.40138924))
            Line((-7.225143941, 7.40138924), (-7.225143941, -7.40138924))
            ThreePointArc((-7.225143941, -7.40138924), (-8.219346695, -9.632258445), (-10.542995546, -10.384503445))
            Line((-10.542995546, -10.384503445), (-15.602808076, -9.845379085))
            ThreePointArc((-15.602808076, -9.845379085), (-16.952978473, -9.355797033), (-17.9208659, -8.294738781))
        make_face()
        with BuildLine():
            Line((-27.776054729, -2.760454133), (-32.346390661, 4.382586826))
            ThreePointArc((-32.346390661, 4.382586826), (-33.54406848, 5.455130866), (-35.123527565, 5.75528395))
            Line((-35.123527565, 5.75528395), (-45.542835136, 4.883527321))
            ThreePointArc((-45.542835136, 4.883527321), (-47.001745989, 4.055488699), (-47.316974898, 2.407854161))
            ThreePointArc((-47.316974898, 2.407854161), (-47.024652941, -0.226247319), (-47.436099119, -2.844386882))
            ThreePointArc((-47.436099119, -2.844386882), (-47.195894764, -4.504619006), (-45.776025692, -5.397950218))
            Line((-45.776025692, -5.397950218), (-30.688474759, -7.352451462))
            ThreePointArc((-30.688474759, -7.352451462), (-27.76964281, -5.984103471), (-27.776054729, -2.760454133))
        make_face()
        with BuildLine():
            Line((5.418334864, -12.681820506), (17.859683052, -13.933213319))
            ThreePointArc((17.859683052, -13.933213319), (20.528994281, -12.788785135), (20.977971059, -9.919402247))
            Line((20.977971059, -9.919402247), (13.466485556, 10.654346756))
            ThreePointArc((13.466485556, 10.654346756), (12.235101202, 12.171546469), (10.330581154, 12.60858855))
            Line((10.330581154, 12.60858855), (5.400718468, 12.08331038))
            ThreePointArc((5.400718468, 12.08331038), (3.487700869, 11.105993422), (2.718570074, 9.100196176))
            Line((2.718570074, 9.100196176), (2.718570074, -9.696881844))
            ThreePointArc((2.718570074, -9.696881844), (3.49363124, -11.709255364), (5.418334864, -12.681820506))
        make_face()
    extrude(amount=CUT_EXTRUDE_5_DEPTH + CUT_EXTRUDE_5_DEPTH_BACK, mode=Mode.SUBTRACT)


solid = part.part
